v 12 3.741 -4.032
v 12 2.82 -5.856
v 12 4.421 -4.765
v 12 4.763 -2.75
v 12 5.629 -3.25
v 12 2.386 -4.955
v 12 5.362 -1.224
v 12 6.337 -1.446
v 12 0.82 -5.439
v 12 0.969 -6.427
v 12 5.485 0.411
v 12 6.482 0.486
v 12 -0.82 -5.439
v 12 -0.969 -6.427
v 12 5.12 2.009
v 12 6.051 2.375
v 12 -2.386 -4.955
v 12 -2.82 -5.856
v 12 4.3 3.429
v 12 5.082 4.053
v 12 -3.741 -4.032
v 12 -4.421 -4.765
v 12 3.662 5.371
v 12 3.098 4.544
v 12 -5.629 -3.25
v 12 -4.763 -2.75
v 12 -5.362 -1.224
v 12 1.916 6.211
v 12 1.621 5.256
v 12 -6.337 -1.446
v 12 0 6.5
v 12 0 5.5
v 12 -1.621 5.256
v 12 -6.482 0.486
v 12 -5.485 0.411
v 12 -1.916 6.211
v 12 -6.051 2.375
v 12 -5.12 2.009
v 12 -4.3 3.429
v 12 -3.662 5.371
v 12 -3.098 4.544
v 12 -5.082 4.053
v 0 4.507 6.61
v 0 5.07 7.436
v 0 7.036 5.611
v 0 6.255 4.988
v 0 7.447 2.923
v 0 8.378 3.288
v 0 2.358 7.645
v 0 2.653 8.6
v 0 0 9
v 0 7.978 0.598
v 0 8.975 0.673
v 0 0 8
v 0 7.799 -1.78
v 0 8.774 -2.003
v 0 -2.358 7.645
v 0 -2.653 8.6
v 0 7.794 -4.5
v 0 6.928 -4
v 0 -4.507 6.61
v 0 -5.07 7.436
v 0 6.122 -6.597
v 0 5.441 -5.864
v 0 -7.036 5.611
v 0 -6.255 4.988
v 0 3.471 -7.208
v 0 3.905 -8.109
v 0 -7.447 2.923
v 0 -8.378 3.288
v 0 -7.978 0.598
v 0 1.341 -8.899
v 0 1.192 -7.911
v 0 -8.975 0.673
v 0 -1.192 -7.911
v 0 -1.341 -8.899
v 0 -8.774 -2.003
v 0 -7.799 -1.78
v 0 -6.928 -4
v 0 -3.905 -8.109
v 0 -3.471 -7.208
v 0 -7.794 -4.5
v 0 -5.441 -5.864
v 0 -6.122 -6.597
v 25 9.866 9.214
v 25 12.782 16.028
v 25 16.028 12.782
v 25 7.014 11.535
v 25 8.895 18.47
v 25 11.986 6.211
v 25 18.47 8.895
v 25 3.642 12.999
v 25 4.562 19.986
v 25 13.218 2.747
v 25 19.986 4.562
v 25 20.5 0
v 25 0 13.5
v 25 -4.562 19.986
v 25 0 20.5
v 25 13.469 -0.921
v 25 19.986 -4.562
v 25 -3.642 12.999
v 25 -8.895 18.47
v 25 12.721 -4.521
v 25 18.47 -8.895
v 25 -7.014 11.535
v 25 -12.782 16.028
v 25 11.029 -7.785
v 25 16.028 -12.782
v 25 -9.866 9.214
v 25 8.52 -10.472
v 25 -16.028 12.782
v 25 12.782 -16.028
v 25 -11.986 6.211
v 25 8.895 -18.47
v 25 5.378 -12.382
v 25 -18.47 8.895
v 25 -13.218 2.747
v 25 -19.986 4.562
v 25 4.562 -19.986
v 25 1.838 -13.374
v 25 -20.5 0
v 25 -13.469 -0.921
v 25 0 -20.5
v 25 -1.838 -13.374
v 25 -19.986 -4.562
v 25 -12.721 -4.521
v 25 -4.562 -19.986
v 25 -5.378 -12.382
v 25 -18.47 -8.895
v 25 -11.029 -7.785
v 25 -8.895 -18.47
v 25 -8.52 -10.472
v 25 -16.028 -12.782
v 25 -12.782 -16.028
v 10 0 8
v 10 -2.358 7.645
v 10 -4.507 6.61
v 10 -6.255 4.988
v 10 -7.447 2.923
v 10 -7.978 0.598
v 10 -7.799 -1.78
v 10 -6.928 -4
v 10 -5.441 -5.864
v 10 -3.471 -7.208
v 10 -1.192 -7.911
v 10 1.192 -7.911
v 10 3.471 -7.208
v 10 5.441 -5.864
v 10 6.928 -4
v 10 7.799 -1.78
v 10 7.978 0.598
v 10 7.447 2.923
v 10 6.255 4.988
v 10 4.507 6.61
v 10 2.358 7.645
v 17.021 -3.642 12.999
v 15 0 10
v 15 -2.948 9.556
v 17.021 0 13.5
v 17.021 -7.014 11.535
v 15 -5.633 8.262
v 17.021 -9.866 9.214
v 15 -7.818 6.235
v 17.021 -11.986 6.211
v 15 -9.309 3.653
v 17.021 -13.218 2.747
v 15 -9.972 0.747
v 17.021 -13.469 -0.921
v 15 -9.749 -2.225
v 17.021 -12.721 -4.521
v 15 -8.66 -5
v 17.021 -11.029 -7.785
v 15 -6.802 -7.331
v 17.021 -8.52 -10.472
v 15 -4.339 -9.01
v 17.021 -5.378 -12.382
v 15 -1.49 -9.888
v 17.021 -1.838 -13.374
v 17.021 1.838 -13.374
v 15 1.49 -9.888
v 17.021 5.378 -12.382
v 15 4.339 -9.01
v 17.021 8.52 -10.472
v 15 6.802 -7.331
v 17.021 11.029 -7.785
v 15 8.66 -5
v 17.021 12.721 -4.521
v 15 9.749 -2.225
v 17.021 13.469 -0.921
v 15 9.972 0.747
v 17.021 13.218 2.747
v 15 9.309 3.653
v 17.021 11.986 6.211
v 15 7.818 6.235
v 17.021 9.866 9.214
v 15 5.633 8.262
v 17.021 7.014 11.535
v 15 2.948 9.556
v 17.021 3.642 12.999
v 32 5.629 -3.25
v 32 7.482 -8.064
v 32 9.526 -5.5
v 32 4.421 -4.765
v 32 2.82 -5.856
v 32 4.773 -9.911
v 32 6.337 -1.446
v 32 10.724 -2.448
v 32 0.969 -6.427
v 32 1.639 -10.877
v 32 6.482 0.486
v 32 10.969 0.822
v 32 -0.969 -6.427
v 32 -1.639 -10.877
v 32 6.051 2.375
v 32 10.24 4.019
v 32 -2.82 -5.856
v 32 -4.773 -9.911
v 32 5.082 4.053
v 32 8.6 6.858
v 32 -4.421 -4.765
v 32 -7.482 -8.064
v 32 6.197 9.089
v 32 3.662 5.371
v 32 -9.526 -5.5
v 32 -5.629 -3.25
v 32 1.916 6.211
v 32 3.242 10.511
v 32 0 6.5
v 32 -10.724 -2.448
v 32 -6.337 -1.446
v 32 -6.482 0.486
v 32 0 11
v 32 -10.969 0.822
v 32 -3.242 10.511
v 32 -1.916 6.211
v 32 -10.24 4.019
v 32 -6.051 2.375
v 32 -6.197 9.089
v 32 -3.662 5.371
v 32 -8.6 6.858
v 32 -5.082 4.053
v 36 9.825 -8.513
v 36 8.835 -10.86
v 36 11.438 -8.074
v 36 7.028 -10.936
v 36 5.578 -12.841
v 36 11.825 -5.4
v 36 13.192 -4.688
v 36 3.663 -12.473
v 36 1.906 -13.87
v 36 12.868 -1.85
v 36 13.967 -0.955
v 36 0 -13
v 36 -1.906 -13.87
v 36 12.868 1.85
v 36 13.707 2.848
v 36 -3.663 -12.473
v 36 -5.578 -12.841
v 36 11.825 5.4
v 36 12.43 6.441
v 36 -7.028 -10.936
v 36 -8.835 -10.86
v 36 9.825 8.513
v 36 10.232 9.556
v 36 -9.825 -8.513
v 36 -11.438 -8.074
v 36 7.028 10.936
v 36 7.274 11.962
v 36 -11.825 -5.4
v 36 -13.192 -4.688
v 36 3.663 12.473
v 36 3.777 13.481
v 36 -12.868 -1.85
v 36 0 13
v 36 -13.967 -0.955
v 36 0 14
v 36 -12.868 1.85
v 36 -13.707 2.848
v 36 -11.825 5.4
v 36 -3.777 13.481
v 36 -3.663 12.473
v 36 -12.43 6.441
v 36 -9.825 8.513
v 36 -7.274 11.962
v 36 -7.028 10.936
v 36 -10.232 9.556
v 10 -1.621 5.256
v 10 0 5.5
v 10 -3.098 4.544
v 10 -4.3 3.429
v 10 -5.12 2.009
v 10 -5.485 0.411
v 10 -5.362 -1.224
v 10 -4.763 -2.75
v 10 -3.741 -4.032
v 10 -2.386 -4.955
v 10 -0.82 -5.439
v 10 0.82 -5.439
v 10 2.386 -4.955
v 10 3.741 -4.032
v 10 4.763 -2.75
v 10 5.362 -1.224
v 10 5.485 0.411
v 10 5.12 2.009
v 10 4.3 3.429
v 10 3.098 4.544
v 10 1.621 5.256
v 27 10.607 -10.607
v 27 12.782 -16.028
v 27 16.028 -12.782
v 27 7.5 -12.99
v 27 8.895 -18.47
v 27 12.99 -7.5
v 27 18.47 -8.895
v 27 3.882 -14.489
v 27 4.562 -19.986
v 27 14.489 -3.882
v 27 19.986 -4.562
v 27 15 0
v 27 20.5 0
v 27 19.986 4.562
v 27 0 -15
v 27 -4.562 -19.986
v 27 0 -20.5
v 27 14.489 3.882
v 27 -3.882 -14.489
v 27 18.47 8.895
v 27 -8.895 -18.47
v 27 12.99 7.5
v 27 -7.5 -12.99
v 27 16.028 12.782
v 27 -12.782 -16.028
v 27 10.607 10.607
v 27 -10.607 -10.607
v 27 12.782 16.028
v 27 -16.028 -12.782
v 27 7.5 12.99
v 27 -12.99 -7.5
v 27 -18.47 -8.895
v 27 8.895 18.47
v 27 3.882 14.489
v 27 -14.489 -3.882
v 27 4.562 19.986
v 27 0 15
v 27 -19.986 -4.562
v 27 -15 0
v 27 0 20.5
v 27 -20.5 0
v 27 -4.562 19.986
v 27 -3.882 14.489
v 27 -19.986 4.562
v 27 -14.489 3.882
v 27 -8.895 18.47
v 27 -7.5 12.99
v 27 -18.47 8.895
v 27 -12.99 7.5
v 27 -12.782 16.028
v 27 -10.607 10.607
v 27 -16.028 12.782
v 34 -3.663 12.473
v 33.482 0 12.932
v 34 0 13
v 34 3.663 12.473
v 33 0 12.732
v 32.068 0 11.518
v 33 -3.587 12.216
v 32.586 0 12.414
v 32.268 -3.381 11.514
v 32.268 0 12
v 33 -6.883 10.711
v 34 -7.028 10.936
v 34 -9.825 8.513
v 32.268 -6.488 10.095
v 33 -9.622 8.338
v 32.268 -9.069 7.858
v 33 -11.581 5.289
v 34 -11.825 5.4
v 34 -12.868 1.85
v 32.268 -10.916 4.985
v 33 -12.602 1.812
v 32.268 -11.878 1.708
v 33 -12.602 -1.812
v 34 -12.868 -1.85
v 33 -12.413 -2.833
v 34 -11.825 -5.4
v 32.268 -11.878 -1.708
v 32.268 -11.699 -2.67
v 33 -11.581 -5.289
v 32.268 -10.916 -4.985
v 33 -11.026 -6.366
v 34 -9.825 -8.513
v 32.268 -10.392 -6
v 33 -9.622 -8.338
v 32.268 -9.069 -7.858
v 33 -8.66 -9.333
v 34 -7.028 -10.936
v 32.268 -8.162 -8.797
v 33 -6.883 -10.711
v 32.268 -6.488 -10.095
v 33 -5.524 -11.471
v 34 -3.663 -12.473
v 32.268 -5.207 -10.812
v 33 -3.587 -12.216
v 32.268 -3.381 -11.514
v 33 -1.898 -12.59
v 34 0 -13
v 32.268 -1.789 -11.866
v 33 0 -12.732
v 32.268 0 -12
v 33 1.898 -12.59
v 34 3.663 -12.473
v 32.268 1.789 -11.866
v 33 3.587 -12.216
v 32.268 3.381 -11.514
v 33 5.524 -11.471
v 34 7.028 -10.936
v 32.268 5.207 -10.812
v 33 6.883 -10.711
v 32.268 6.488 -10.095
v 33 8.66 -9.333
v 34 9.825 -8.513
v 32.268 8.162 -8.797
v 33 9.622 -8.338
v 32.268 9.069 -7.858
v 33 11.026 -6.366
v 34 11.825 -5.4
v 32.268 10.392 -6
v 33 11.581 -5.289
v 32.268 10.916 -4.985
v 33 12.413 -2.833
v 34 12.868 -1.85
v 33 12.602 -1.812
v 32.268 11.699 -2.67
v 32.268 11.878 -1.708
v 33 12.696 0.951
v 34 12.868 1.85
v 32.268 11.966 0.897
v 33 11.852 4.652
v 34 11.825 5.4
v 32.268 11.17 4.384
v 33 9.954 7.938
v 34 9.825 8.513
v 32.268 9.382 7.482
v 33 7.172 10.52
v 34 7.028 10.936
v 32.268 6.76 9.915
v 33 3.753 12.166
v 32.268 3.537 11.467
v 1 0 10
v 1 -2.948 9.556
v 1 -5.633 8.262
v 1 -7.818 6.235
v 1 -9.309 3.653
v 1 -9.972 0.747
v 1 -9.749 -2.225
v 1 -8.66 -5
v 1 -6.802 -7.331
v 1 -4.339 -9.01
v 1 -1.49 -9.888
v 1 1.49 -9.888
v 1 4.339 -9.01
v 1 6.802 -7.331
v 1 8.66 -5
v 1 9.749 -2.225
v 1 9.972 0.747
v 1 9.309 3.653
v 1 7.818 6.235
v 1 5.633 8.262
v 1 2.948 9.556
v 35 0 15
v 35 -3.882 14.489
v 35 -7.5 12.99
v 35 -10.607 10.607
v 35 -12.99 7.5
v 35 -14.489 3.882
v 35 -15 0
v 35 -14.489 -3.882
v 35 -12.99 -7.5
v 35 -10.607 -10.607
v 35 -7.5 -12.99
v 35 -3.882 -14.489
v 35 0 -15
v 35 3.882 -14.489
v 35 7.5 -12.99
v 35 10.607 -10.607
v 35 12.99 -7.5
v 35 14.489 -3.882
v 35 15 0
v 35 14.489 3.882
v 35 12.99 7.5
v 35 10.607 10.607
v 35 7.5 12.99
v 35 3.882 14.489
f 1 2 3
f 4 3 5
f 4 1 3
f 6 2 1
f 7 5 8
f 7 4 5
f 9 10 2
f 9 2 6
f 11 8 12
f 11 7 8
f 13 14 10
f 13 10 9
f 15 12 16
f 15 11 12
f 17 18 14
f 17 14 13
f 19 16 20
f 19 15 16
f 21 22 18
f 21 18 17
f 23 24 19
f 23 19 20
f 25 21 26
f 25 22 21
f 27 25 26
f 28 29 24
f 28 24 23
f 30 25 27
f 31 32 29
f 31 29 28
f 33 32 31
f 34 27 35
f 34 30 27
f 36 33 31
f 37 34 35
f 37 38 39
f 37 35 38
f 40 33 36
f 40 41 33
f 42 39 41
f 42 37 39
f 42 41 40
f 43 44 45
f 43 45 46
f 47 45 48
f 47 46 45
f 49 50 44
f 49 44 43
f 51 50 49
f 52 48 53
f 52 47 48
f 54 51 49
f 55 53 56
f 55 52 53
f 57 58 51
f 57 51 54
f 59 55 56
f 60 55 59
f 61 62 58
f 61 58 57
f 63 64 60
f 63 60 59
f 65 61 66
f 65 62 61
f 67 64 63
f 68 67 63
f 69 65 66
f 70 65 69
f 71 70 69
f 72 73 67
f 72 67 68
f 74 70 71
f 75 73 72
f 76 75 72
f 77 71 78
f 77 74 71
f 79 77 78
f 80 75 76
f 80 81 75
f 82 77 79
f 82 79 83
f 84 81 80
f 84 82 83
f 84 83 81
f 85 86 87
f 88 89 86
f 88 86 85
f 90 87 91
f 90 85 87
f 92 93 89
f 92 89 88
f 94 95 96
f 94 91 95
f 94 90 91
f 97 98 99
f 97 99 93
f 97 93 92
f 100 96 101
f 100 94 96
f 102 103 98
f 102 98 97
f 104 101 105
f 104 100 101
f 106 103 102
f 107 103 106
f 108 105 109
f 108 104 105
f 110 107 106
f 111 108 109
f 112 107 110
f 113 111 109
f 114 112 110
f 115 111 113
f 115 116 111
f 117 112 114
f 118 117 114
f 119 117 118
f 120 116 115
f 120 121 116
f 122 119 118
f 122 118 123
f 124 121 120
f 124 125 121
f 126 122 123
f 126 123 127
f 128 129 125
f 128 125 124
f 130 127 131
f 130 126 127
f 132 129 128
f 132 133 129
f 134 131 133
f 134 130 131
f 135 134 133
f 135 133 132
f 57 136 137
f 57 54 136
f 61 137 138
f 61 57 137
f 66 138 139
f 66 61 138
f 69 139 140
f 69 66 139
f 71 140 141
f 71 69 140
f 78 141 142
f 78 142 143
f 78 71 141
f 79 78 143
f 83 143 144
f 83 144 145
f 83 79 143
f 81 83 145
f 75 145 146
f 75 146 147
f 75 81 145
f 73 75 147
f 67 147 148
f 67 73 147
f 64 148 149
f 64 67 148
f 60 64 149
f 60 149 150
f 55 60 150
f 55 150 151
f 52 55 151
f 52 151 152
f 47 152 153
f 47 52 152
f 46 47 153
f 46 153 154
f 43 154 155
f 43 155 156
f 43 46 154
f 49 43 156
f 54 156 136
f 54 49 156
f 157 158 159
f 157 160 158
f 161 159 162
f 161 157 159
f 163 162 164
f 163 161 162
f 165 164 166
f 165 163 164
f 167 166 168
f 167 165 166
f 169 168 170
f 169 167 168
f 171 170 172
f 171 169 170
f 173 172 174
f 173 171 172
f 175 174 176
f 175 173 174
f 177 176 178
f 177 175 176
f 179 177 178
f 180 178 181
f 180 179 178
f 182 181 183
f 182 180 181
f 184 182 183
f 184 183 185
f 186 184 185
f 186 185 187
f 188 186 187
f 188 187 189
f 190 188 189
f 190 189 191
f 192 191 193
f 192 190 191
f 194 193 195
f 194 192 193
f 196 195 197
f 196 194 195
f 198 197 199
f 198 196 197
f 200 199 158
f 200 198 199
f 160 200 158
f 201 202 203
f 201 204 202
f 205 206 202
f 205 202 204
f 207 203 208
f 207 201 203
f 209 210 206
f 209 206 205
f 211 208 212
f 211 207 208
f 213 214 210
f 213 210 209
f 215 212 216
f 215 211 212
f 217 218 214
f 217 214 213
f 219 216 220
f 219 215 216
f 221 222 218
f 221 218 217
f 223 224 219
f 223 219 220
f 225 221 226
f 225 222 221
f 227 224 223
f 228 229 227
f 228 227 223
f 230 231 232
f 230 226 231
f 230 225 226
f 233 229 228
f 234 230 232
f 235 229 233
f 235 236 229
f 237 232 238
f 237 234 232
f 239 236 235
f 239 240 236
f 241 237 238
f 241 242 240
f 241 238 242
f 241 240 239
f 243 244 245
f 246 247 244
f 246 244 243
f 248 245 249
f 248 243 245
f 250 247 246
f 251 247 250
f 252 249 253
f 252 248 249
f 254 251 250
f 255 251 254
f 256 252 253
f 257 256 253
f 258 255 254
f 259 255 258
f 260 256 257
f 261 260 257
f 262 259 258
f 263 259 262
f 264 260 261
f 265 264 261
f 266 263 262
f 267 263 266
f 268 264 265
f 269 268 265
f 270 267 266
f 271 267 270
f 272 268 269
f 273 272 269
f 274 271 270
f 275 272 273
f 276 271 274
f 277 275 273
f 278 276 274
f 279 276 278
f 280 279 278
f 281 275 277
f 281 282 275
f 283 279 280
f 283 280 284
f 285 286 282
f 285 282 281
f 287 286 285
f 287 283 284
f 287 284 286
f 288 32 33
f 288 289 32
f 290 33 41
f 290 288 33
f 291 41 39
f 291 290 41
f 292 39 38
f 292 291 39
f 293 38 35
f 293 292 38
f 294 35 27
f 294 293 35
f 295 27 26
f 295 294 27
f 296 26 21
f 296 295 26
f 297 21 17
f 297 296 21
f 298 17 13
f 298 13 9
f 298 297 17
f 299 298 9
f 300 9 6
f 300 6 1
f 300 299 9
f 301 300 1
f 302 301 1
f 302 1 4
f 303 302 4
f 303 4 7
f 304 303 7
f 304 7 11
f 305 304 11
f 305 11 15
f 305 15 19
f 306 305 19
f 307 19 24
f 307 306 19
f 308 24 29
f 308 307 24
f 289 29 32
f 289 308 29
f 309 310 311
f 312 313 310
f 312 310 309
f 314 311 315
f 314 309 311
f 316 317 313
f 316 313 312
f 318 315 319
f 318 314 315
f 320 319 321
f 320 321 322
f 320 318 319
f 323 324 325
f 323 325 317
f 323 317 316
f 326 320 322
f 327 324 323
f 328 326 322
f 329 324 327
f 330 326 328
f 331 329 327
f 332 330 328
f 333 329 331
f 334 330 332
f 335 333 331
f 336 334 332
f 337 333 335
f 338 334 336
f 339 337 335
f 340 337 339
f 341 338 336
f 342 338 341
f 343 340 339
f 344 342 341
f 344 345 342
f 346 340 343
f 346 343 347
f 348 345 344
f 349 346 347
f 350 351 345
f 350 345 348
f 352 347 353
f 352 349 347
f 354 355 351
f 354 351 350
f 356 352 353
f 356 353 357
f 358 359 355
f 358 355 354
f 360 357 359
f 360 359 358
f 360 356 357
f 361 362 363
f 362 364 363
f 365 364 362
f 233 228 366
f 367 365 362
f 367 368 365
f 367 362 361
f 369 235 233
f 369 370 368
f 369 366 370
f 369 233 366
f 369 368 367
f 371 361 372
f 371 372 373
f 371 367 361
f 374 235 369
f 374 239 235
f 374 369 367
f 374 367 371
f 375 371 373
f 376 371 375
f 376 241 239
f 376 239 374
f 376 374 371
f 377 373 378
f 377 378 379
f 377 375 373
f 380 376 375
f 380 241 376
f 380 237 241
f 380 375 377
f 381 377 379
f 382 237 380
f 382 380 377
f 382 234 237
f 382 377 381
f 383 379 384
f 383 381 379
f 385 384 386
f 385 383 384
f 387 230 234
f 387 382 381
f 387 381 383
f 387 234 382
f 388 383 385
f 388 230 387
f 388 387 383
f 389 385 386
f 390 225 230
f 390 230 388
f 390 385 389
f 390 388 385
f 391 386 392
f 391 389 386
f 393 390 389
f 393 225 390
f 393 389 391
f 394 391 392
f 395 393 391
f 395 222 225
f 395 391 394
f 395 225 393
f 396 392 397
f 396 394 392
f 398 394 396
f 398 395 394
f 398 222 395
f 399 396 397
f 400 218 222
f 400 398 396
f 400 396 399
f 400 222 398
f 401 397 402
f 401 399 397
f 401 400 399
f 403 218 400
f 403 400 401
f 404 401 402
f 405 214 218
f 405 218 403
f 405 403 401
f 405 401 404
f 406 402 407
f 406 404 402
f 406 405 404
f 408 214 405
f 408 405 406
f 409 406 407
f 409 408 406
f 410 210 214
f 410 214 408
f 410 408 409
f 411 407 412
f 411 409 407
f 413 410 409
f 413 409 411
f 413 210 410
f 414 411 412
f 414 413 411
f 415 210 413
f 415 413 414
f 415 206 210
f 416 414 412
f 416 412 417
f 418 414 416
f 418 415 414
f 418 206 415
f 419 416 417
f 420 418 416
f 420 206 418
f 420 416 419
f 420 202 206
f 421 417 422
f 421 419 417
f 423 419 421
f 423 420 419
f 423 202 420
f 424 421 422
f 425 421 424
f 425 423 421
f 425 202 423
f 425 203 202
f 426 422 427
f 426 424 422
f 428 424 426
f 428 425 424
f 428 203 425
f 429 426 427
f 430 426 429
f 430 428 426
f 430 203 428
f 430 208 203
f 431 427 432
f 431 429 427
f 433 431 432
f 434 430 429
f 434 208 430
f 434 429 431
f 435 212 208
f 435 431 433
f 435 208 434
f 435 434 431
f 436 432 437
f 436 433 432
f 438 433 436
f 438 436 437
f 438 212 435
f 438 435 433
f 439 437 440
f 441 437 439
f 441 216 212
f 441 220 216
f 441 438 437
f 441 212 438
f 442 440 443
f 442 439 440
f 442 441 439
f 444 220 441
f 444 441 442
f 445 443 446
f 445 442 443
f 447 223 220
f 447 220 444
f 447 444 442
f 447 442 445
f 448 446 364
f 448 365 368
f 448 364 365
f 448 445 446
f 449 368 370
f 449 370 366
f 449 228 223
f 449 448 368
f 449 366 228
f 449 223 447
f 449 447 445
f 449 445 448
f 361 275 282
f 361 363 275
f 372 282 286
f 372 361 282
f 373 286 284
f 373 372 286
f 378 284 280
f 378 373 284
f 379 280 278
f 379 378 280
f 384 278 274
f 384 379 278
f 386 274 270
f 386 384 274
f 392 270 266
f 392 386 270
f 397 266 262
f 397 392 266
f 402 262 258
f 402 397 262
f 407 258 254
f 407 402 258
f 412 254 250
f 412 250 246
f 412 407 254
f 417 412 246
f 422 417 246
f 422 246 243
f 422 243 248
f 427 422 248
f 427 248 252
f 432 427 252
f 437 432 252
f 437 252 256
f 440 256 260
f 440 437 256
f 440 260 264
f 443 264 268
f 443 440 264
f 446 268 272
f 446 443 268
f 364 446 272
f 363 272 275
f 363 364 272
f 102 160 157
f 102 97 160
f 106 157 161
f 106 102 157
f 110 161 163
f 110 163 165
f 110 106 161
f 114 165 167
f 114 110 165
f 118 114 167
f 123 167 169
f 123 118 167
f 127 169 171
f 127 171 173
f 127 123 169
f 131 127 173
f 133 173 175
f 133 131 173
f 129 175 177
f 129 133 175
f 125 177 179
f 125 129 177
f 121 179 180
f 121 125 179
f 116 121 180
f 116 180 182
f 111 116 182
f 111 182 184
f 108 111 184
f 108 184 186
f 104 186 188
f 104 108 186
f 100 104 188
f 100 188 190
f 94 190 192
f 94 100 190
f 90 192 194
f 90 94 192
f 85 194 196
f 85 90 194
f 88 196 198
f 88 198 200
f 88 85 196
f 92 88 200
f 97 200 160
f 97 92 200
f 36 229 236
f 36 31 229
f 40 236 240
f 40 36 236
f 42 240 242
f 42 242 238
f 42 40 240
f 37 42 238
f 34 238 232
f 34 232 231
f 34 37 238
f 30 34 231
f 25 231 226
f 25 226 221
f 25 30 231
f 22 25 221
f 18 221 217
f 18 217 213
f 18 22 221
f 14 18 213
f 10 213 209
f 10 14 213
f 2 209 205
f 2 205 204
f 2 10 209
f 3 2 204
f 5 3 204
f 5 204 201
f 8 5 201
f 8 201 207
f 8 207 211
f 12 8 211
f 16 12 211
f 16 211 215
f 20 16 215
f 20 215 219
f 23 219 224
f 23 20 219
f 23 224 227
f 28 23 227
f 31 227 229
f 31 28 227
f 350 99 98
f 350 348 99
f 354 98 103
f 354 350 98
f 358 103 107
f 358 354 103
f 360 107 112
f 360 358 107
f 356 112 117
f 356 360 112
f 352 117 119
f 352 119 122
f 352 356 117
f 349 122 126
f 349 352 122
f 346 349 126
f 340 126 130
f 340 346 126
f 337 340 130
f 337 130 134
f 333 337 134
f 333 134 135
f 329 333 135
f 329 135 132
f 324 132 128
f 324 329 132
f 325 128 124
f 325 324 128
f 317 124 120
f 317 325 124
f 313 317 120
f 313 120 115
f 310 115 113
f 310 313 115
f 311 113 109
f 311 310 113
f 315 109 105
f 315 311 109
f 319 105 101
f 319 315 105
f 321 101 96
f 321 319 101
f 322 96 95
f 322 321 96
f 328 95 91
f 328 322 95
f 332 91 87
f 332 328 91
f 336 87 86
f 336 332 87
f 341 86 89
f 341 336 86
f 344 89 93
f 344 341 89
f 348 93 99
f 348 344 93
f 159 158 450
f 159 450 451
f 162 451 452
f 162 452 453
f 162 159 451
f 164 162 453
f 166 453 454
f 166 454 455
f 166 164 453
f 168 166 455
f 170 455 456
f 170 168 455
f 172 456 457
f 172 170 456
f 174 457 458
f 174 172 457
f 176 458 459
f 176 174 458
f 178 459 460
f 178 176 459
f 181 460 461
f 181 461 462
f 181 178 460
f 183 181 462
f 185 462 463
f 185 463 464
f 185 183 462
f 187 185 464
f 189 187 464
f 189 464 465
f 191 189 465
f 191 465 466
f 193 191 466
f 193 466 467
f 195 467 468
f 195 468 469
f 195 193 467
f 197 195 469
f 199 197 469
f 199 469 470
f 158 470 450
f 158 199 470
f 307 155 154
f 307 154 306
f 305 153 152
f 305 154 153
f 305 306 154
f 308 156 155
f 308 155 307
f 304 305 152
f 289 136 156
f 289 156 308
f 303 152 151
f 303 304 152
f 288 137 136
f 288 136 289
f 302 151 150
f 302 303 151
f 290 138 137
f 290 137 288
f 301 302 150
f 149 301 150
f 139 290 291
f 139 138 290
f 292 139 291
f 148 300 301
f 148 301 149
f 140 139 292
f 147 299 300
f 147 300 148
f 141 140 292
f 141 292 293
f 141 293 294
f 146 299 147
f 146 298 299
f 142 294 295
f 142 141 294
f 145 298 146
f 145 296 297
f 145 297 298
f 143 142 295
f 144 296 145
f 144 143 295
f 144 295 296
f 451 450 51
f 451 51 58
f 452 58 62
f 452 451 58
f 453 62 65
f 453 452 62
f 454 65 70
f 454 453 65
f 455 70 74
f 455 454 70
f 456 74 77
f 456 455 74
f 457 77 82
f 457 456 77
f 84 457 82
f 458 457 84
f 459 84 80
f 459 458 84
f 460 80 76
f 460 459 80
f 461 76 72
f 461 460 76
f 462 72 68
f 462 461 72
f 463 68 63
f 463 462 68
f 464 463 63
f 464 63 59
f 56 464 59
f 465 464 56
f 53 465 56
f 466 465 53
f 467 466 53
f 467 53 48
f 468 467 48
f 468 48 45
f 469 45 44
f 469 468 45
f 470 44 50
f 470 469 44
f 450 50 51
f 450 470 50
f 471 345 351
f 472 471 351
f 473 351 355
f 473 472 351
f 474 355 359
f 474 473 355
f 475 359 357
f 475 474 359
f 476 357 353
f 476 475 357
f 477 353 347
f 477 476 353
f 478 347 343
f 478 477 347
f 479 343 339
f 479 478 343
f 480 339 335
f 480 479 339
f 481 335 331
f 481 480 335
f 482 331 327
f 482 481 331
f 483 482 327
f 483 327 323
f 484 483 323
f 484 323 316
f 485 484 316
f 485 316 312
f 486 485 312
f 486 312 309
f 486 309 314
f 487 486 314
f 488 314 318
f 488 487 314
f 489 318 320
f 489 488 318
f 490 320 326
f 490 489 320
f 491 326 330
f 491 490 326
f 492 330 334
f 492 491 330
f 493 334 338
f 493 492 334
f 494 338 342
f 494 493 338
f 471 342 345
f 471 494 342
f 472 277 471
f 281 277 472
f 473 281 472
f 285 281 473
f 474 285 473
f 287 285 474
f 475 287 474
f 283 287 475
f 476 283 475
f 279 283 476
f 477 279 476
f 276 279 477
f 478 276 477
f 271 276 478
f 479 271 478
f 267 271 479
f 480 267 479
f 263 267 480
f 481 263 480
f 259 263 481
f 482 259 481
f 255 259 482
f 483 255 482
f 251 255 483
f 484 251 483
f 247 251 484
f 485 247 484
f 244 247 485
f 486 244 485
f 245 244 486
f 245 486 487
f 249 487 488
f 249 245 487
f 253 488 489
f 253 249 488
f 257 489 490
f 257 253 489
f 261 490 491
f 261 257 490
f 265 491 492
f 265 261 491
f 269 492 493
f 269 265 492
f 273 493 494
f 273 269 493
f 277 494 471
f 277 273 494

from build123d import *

# Parameters (mm, degrees)
CHAMFER1_SIZE = 1


with BuildPart() as part:
    # Sketch2 → Revolve1 (revolve)
    with BuildSketch(Plane.XY, mode=Mode.PRIVATE) as revolve1_sk:
        with BuildLine():
            Line((0, 8), (0, 10))
            Line((0, 10), (15, 10))
            Line((15, 10), (17.020725942, 13.5))
            Line((17.020725942, 13.5), (25, 13.5))
            Line((25, 13.5), (25, 20.5))
            Line((25, 20.5), (27, 20.5))
            Line((27, 20.5), (27, 15))
            Line((27, 15), (36, 15))
            Line((36, 15), (36, 13))
            Line((36, 13), (34, 13))
            ThreePointArc((34, 13), (32.585786438, 12.414213562), (32, 11))
            Line((32, 11), (32, 6.5))
            Line((32, 6.5), (12, 6.5))
            Line((12, 6.5), (12, 5.5))
            Line((12, 5.5), (10, 5.5))
            Line((10, 5.5), (10, 8))
            Line((10, 8), (0, 8))
        make_face()
    revolve(revolve1_sk.sketch.rotate(Axis((0, 0, 0), (1, 0, 0)), 90), axis=Axis((0, 0, 0), (1, 0, 0)))

    # Chamfer1
    chamfer1_edges = [part.edges().sort_by_distance(p)[0] for p in [
        (0, 0, -10),
        (36, 0, -15),
    ]]
    chamfer(chamfer1_edges, length=CHAMFER1_SIZE)


solid = part.part
